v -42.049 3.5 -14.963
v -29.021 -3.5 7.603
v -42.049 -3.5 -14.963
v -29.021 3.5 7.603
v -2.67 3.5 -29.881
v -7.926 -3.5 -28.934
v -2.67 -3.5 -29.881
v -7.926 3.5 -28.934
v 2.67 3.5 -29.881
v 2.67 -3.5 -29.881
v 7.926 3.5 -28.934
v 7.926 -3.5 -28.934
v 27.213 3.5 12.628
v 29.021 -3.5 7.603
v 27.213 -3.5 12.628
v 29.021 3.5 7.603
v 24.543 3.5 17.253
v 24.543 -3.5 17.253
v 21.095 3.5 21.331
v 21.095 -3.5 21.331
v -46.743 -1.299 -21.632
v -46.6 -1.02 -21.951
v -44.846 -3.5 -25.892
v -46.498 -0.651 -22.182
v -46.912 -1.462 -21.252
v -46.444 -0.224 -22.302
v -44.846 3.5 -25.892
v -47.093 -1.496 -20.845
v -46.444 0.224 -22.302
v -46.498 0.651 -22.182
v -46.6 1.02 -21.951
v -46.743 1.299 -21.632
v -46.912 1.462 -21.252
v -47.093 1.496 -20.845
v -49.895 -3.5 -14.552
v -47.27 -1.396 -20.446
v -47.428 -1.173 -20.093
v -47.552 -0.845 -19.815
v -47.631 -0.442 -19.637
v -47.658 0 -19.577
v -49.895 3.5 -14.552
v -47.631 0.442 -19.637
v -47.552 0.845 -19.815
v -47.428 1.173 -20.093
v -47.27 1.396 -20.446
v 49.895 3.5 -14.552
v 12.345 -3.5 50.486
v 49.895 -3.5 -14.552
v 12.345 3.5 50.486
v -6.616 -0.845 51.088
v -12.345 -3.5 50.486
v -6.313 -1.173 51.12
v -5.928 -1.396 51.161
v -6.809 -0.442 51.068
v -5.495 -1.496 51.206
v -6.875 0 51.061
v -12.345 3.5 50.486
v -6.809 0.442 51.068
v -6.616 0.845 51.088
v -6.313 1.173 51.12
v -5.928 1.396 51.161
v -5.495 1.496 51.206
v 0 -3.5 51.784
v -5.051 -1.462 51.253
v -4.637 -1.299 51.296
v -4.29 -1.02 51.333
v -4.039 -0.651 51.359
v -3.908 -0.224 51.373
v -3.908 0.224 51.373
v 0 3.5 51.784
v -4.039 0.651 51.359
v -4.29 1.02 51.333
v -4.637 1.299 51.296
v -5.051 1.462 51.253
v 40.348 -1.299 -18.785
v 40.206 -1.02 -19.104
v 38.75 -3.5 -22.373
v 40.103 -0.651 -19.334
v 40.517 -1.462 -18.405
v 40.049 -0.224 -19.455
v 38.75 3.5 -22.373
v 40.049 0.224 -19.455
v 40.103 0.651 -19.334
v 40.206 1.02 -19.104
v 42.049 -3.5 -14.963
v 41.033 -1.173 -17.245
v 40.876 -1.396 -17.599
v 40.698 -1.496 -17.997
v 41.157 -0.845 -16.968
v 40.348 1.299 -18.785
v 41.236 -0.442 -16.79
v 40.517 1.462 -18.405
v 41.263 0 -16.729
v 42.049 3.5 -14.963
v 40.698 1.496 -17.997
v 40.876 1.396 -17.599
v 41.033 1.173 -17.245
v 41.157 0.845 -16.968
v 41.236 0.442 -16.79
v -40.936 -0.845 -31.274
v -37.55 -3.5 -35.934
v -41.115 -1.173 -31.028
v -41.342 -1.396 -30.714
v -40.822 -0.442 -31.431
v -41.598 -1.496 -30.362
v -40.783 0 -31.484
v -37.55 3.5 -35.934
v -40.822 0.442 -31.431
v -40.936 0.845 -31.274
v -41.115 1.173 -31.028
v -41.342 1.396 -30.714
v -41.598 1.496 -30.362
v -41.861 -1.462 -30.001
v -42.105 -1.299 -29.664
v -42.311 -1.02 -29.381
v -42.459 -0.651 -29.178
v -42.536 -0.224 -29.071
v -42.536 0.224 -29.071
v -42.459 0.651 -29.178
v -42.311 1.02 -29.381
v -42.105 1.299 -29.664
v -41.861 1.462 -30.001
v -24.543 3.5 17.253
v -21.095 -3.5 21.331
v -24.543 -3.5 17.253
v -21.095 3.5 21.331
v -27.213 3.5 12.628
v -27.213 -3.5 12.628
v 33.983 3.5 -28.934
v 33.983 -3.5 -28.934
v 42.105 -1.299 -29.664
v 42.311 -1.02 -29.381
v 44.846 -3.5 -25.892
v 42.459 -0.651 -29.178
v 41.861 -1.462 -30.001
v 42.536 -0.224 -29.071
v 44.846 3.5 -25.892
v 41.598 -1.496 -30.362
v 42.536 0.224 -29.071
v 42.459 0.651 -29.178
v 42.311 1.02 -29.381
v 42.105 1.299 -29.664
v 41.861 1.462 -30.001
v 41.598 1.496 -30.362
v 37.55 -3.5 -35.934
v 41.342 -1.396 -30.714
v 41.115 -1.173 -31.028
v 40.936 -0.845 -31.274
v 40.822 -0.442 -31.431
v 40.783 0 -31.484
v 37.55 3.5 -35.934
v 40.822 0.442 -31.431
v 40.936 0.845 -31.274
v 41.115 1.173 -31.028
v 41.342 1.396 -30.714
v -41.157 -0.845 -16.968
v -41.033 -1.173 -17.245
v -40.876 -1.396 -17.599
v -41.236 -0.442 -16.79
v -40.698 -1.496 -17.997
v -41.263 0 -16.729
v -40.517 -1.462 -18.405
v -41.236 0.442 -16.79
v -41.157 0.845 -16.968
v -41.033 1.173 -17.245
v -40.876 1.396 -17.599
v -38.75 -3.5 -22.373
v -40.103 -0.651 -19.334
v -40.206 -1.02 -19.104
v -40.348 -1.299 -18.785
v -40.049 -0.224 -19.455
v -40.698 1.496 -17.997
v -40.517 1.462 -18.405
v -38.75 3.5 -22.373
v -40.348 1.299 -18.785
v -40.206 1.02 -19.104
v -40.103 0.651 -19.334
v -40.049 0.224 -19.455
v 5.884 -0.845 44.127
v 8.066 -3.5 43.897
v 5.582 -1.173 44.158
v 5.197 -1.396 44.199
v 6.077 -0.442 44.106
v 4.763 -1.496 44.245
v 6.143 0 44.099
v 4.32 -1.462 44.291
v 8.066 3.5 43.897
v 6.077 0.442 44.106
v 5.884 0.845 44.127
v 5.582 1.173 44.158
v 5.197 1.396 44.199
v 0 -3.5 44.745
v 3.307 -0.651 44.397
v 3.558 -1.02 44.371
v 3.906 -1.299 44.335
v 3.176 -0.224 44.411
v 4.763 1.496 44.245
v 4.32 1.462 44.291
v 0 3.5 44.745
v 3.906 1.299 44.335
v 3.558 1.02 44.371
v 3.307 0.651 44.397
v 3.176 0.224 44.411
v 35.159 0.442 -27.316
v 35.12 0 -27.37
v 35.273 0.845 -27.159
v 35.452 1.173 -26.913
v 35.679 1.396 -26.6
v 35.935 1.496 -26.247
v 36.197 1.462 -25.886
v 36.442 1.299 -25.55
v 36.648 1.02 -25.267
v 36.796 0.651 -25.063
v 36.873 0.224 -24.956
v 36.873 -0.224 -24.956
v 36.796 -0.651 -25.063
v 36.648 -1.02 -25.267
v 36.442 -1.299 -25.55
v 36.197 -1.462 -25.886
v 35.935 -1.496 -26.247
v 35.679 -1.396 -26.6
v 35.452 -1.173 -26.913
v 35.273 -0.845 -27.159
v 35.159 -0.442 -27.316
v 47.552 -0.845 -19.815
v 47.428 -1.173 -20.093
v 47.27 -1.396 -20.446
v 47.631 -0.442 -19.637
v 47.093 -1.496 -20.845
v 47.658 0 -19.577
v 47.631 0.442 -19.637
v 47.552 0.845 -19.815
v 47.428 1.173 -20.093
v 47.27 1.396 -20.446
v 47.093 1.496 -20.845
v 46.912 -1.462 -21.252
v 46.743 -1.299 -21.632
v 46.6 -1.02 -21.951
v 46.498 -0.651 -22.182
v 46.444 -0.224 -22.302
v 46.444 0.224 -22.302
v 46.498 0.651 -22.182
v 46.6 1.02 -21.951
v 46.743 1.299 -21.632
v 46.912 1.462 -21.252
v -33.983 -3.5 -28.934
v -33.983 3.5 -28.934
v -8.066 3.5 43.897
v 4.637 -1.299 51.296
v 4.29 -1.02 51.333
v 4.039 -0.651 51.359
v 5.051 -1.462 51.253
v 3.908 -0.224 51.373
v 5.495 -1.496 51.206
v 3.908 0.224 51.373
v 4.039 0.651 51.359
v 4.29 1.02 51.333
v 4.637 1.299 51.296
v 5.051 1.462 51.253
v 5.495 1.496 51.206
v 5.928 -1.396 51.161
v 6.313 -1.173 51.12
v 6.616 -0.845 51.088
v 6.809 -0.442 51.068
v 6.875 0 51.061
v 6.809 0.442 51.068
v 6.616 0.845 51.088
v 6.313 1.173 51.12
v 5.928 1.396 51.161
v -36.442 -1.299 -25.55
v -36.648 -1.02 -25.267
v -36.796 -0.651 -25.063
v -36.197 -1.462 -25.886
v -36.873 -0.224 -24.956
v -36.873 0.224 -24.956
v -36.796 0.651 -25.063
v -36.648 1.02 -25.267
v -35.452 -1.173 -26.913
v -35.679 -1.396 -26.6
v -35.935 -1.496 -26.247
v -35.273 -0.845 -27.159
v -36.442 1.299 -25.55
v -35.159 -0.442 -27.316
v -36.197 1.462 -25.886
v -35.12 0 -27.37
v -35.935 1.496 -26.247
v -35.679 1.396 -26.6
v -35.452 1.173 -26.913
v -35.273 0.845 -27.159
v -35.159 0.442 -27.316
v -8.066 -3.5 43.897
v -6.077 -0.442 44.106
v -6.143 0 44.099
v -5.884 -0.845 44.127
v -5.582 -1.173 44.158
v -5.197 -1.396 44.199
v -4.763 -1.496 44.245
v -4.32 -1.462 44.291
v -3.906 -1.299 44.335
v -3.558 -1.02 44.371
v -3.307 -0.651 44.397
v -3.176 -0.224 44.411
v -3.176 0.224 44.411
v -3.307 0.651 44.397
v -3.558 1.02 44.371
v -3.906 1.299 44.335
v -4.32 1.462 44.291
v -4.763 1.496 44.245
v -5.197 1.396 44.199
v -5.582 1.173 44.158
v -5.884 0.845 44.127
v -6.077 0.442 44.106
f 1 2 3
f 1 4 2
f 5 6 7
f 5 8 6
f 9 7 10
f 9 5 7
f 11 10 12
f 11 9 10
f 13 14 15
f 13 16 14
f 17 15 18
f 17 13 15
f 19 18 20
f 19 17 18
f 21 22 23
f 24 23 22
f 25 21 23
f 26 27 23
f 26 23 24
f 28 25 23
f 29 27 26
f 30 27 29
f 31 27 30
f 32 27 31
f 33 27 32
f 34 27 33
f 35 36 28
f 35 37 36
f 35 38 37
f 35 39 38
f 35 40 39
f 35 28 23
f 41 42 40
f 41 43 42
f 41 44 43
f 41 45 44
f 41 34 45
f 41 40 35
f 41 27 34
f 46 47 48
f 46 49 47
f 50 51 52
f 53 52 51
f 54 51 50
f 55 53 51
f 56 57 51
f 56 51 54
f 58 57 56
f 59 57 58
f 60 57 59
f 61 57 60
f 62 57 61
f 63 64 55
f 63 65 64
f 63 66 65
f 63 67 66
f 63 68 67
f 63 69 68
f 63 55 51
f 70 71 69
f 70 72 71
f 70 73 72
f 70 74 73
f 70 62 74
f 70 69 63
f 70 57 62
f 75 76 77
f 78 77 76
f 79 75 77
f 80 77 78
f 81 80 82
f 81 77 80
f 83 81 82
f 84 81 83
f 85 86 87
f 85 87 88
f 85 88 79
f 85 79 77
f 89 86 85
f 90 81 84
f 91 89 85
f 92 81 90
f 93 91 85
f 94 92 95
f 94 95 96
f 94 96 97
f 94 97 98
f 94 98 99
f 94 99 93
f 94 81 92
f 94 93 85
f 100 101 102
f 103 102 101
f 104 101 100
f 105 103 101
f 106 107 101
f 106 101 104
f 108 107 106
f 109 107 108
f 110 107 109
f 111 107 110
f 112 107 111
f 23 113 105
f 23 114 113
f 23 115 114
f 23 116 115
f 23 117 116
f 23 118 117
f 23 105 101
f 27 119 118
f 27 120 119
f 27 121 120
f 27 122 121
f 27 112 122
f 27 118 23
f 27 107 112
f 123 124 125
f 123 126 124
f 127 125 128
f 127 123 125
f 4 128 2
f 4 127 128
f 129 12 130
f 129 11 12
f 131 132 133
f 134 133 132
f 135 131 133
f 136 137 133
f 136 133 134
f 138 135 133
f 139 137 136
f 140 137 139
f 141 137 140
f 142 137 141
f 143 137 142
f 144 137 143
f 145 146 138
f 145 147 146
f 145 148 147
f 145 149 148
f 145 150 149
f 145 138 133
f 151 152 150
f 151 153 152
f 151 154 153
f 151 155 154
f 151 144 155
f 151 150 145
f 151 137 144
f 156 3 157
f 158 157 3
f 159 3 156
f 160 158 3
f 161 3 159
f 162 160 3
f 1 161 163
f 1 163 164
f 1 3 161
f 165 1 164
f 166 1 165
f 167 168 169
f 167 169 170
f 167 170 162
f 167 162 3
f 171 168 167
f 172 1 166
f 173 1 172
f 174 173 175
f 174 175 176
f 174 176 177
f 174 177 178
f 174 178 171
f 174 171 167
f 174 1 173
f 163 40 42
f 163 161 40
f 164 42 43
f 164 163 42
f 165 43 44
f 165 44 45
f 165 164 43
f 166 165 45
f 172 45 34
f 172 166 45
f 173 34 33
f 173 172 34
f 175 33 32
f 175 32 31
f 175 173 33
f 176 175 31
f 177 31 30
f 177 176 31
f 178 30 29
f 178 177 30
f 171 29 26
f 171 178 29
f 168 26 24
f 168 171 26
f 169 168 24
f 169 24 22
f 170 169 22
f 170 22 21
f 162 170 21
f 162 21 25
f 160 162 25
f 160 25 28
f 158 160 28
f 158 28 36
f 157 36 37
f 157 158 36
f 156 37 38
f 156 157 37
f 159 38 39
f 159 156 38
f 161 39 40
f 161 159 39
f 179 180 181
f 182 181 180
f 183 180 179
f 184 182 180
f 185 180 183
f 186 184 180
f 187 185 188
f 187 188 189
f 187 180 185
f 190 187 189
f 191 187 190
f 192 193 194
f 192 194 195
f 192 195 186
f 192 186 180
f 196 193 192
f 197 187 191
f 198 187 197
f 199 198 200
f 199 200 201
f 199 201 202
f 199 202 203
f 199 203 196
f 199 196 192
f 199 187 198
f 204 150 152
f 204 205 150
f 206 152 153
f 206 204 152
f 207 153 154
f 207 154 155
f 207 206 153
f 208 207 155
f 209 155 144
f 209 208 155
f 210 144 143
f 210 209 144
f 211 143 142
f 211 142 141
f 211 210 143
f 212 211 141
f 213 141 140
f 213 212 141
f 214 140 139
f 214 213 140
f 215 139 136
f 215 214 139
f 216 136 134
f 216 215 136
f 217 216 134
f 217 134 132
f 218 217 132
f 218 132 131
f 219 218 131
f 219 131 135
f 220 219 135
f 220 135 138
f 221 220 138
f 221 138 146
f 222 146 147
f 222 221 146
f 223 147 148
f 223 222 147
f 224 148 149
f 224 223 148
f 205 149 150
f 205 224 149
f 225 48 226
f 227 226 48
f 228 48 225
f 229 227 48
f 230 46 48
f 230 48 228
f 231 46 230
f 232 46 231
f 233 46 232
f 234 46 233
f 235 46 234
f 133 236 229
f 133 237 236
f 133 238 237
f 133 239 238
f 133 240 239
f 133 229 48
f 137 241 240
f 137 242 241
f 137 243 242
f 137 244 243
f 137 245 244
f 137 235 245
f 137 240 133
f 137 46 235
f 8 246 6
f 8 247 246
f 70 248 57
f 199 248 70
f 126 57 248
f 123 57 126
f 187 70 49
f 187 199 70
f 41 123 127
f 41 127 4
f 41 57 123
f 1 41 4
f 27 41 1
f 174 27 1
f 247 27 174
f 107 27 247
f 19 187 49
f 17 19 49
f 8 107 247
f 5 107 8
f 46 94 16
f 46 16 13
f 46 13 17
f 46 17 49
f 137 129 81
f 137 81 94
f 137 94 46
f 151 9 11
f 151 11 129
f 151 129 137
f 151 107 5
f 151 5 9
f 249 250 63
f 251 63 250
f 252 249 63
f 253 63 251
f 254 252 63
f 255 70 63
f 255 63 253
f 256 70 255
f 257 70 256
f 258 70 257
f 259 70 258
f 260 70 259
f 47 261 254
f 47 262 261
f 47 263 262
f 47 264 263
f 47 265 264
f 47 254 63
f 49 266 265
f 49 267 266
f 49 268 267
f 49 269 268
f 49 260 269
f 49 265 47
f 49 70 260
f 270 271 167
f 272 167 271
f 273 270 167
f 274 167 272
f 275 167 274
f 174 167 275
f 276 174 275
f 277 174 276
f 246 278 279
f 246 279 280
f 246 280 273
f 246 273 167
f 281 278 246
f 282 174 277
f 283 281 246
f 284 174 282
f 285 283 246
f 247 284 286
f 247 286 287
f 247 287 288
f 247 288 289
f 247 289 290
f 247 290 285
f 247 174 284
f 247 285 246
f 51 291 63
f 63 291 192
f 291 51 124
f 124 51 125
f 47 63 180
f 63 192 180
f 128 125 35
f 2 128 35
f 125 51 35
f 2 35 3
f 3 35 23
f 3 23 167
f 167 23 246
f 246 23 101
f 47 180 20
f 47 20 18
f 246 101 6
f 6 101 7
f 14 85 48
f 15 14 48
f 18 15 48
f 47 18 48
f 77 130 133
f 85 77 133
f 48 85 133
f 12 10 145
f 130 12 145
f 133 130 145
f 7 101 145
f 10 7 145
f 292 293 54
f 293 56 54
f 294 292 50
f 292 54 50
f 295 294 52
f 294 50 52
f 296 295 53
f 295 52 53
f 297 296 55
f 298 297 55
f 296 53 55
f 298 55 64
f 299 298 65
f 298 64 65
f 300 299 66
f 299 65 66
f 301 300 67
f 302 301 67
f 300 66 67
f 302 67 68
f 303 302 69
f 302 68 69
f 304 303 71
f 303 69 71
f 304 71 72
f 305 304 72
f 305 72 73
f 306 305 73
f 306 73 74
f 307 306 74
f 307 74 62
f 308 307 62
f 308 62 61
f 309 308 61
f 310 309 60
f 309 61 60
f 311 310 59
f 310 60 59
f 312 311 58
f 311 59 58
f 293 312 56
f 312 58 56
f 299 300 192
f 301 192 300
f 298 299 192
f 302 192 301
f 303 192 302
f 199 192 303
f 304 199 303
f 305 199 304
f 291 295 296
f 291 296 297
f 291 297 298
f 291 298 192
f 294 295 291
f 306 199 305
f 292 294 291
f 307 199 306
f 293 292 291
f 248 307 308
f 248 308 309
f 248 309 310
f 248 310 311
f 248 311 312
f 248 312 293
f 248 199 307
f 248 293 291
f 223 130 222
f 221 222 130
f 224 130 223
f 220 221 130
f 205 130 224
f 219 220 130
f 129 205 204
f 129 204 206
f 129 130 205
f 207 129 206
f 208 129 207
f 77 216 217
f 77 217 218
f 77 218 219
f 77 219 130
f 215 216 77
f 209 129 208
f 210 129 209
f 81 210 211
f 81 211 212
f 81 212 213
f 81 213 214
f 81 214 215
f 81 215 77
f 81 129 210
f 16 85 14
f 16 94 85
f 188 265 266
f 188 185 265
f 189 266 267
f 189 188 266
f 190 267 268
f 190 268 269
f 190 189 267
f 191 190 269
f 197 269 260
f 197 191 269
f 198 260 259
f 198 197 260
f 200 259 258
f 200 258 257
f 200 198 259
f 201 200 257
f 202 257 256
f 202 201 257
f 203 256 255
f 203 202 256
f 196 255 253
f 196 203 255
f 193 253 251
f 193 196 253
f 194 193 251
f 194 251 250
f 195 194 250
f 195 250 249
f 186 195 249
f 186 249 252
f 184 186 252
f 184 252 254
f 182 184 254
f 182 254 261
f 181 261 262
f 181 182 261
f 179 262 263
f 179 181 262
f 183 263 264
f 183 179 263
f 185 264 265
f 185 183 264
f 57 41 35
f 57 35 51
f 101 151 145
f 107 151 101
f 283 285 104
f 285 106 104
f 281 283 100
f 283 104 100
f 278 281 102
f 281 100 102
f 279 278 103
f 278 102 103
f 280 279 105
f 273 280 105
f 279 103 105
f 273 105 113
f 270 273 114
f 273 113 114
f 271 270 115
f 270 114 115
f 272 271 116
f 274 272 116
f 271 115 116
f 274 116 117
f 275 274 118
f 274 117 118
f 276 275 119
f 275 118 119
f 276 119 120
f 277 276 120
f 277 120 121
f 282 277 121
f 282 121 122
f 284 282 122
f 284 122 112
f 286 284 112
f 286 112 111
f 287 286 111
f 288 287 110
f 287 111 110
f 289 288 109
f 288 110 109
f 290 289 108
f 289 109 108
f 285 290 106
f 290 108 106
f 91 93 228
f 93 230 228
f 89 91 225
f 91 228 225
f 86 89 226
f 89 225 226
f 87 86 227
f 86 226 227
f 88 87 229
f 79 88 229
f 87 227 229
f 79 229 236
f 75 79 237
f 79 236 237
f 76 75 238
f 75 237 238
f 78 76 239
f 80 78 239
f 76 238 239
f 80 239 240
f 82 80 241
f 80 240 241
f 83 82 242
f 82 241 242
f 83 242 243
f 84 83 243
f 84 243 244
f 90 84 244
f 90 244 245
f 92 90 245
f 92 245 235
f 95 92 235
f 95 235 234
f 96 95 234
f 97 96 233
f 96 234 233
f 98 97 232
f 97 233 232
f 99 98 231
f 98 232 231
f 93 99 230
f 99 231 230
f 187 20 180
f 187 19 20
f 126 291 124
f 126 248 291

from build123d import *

# Parameters (mm, degrees)
EXTRUDE_1_DEPTH          = 3.5
PATTERN_CIRCULAR_1_COUNT = 3


with BuildPart() as part:
    # Эскиз1 → Бобышка-Вытянуть1 (new, symmetric)
    with BuildSketch(Plane(origin=(0, 0, 0), x_dir=(1, 0, 0), z_dir=(0, 1, 0))):
        Polygon((-44.845979262, 25.891838199), (-49.89474757, 14.552118915), (-12.344869126, -50.486178369), (0, -51.783676398), (12.344869126, -50.486178369), (49.89474757, 14.552118915), (44.845979262, 25.891838199), (37.549878444, 35.934059454), (-37.549878444, 35.934059454), align=None)
        with BuildLine():
            Line((-38.750409265, 22.37255922), (-33.983200298, 28.934059454))
            Line((-33.983200298, 28.934059454), (-7.925919728, 28.934059454))
            ThreePointArc((-7.925919728, 28.934059454), (0, 30), (7.925919728, 28.934059454))
            Line((7.925919728, 28.934059454), (33.983200298, 28.934059454))
            Line((33.983200298, 28.934059454), (38.750409265, 22.37255922))
            Line((38.750409265, 22.37255922), (42.04923067, 14.963285033))
            Line((42.04923067, 14.963285033), (29.020590385, -7.602981894))
            ThreePointArc((29.020590385, -7.602981894), (25.980762114, -15), (21.094670658, -21.331077559))
            Line((21.094670658, -21.331077559), (8.066030373, -43.897344487))
            Line((8.066030373, -43.897344487), (0, -44.745118441))
            Line((0, -44.745118441), (-8.066030373, -43.897344487))
            Line((-8.066030373, -43.897344487), (-21.094670658, -21.331077559))
            ThreePointArc((-21.094670658, -21.331077559), (-25.980762114, -15), (-29.020590385, -7.602981894))
            Line((-29.020590385, -7.602981894), (-42.04923067, 14.963285033))
            Line((-42.04923067, 14.963285033), (-38.750409265, 22.37255922))
        make_face(mode=Mode.SUBTRACT)
    extrude(amount=EXTRUDE_1_DEPTH, both=True)

    # Эскиз1<3> → Вырез-Повернуть1 (revolve, cut)
    with BuildSketch(Plane(origin=(0, 0, 0), x_dir=(1, 0, 0), z_dir=(0, 1, 0))):
        Polygon((-41.26287783, 16.72946243), (-40.652772865, 18.099780617), (-47.047591069, 20.946937118), (-47.657696033, 19.576618932), align=None)
    cut_revolve_1 = revolve(axis=Axis((0, 0, 0), (-0.9135454576426014, 0, -0.406736643075799)), mode=Mode.SUBTRACT)

    # Эскиз1<4> → Вырез-Повернуть2 (revolve, cut)
    with BuildSketch(Plane(origin=(0, 0, 0), x_dir=(1, 0, 0), z_dir=(0, 1, 0))):
        Polygon((-41.66437521, 30.270940493), (-36.00125625, 26.156443727), (-35.119578371, 27.369969219), (-40.782697332, 31.484465985), align=None)
    cut_revolve_2 = revolve(axis=Axis((0, 0, 0), (-0.8090169943749476, 0, -0.587785252292473)), mode=Mode.SUBTRACT)

    # Круговой массив1: Вырез-Повернуть1, Вырез-Повернуть2 ×3 about axis
    pattern_circular_1_axis = Axis((0, 3.5, 0), (0, -1, 0))
    add([cut_revolve_1.rotate(pattern_circular_1_axis, i * 360 / PATTERN_CIRCULAR_1_COUNT) for i in range(1, PATTERN_CIRCULAR_1_COUNT)], mode=Mode.SUBTRACT)
    add([cut_revolve_2.rotate(pattern_circular_1_axis, i * 360 / PATTERN_CIRCULAR_1_COUNT) for i in range(1, PATTERN_CIRCULAR_1_COUNT)], mode=Mode.SUBTRACT)


solid = part.part
